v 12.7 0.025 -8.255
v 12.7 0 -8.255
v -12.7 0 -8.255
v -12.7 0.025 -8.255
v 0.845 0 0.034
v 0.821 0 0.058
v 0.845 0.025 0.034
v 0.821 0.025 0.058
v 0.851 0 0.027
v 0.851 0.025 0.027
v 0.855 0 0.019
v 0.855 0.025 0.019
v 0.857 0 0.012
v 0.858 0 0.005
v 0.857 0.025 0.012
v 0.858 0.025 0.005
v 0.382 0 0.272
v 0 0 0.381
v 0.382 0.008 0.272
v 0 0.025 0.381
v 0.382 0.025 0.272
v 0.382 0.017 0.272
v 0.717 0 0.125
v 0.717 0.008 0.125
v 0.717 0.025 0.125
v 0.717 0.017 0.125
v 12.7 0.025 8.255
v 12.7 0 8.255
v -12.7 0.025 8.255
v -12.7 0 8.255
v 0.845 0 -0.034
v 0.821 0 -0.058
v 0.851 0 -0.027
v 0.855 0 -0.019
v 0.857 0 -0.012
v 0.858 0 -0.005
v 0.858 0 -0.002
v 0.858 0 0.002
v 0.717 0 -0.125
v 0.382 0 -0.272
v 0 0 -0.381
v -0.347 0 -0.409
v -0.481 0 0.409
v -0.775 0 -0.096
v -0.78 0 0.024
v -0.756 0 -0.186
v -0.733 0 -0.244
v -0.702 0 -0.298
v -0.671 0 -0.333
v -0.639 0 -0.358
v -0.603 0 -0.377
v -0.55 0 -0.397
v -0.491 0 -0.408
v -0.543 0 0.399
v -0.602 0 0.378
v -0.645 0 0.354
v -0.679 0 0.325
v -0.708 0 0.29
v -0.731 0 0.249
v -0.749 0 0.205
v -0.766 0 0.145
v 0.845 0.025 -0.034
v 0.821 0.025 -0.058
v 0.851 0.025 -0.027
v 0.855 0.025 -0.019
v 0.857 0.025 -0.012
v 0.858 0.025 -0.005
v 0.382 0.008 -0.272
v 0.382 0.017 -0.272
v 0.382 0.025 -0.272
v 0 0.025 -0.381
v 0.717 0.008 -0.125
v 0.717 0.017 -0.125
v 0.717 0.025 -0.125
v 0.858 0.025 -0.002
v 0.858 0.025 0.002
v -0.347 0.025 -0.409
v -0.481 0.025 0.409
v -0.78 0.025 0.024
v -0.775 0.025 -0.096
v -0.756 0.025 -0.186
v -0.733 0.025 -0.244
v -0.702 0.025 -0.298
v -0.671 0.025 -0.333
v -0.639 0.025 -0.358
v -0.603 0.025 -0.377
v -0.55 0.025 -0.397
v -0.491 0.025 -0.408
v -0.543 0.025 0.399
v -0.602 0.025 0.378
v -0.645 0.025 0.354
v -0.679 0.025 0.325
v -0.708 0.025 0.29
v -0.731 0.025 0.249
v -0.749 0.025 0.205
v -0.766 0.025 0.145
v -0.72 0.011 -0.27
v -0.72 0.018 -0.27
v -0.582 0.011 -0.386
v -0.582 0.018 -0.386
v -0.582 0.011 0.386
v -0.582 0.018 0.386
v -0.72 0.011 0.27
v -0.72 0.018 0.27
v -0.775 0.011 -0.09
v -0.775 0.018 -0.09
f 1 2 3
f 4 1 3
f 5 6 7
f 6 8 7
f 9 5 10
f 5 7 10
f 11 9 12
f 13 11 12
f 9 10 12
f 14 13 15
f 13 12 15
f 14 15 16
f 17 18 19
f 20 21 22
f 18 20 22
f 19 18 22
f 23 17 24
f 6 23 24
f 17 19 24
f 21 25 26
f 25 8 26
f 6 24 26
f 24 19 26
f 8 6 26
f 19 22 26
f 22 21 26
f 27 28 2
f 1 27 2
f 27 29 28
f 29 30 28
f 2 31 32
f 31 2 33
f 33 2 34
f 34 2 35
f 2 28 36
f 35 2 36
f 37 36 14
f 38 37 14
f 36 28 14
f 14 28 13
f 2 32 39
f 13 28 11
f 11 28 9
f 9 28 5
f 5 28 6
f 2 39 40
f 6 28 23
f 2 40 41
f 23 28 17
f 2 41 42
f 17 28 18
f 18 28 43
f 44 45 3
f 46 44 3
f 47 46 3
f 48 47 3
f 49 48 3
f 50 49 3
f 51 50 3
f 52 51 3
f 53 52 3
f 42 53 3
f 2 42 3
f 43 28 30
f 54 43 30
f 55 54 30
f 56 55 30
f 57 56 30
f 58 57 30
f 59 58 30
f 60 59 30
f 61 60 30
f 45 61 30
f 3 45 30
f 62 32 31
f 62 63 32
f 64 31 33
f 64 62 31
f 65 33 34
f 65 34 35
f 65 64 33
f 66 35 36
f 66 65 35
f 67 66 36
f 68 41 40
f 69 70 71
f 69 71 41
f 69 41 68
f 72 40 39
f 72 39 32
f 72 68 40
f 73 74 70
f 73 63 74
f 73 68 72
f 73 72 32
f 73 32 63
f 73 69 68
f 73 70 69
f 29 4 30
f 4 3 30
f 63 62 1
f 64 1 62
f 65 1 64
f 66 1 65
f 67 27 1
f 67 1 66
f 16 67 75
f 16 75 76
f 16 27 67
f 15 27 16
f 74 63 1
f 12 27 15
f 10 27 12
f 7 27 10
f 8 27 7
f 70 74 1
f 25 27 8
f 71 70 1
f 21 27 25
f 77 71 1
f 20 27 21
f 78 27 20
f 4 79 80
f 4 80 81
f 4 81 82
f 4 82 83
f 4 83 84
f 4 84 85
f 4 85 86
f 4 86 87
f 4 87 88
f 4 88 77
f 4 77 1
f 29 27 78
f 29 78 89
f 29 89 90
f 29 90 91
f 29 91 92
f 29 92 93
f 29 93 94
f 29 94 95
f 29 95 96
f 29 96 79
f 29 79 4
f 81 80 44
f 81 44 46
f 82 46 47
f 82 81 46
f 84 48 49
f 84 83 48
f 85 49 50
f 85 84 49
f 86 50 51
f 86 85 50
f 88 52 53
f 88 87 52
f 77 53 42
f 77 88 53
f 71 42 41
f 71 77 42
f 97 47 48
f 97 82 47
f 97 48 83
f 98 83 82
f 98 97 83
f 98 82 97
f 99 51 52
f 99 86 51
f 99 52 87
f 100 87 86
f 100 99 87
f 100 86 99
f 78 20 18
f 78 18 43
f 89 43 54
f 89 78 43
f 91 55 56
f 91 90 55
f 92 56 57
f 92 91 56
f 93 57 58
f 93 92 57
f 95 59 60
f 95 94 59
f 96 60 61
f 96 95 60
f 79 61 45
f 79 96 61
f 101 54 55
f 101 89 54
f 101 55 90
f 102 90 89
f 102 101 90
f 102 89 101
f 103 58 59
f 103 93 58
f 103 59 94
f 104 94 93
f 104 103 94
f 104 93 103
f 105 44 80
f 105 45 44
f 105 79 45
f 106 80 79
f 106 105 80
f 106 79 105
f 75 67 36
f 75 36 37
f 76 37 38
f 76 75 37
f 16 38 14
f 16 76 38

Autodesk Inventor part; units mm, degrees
ref_plane "YZ Plane" through (0, 0, 0) normal (1, 0, 0) x (0, 1, 0)
ref_plane "XZ Plane" through (0, 0, 0) normal (0, 1, 0) x (-1, 0, 0)
ref_plane "XY Plane" through (0, 0, 0) normal (0, 0, 1) x (1, 0, 0)
sketch "stock_cut_for_holder" plane through (0, 0, 0) normal (0, 1, 0) x (-1, 0, 0)
  line L0 (-12.7, -8.255) -> (12.7, -8.255)
  line L1 (12.7, -8.255) -> (12.7, 8.255)
  line L2 (12.7, 8.255) -> (-12.7, 8.255)
  line L3 (-12.7, 8.255) -> (-12.7, -8.255)
  line L4 (-12.7, -8.255) -> (12.7, 8.255) construction
  line L5 (12.7, -8.255) -> (-12.7, 8.255) construction
  point P0 (0, 0)
  dimension "cut_shim_height" = 25.4
  dimension "cut_shim_width" = 16.51
extrude "Plate1" add sketch "stock_cut_for_holder" along normal blind 0.0254
sketch "mill_path" plane through (0, 0.0254, 0) normal (0, 1, 0) x (1, 0, 0)
  line L0 (12.7, 8.255) -> (12.7, -8.255) projected
  line L1 (-12.7, 8.255) -> (12.7, 8.255) projected
  line L2 (-12.7, -8.255) -> (-12.7, 8.255) projected
  line L3 (12.7, -8.255) -> (-12.7, -8.255) projected
  line L4 (-12.7, 8.255) -> (-12.7, -8.255) projected
  line L5 (-12.7, 0) -> (12.7, 0) construction
  line L6 (12.7, -8.255) -> (12.7, 8.255) projected
  line L7 (0, 0) -> (0, -0.381) construction
  line L8 (0, 0) -> (0, 0.381) construction
  line L9 (-0.4445, 0) -> (-0.4445, -0.4255) construction
  line L10 (-0.4445, 0) -> (-0.4445, 0.4254) construction
  line L11 (0.5842, 0) -> (0.5842, -0.1905) construction
  line L12 (-0.6795, 0) -> (-0.6795, -0.3747) construction
  line L13 (0.5842, 0) -> (0.5842, 0.1905) construction
  line L14 (-0.6795, 0) -> (-0.6795, 0.3746) construction
  line L15 (-0.5398, 0) -> (-0.5397, -0.4001) construction
  line L16 (-0.5398, 0) -> (-0.5398, 0.4) construction
  line L17 (0.5842, 0) -> (0.5842, 0.1905) construction
  line L18 (-0.7747, 0) -> (-0.7747, -0.1778) construction
  line L19 (-0.7747, 0) -> (-0.7747, 0.1778)
  line L20 (0.8382, 0) -> (0.8382, -0.0419) construction
  line L21 (0.8382, 0) -> (0.8382, 0.0419) construction
  spline S0 degree 3 poles (0, -0.381) (0.3656, -0.3096) (0.8827, -0.082) (0.8572, 0) knots 0 0 0 0 1 1 1 1
  spline S1 degree 3 poles (0, 0.381) (0.3656, 0.3096) (0.8827, 0.082) (0.8572, 0) knots 0 0 0 0 1 1 1 1
  line L22 (0, -0.381) -> (-0.4445, -0.4255) construction
  line L23 (-0.4445, -0.4255) -> (-0.5397, -0.4001) construction
  line L24 (-0.5397, -0.4001) -> (-0.6795, -0.3747) construction
  line L25 (-0.6795, -0.3747) -> (-0.7747, -0.1778) construction
  line L26 (-0.7747, -0.1778) -> (-0.7849, 0) construction
  line L27 (-0.7849, 0) -> (-0.7747, 0.1778) construction
  line L28 (-0.7747, 0.1778) -> (-0.6795, 0.3746) construction
  line L29 (-0.6795, 0.3746) -> (-0.5398, 0.4) construction
  line L30 (-0.5398, 0.4) -> (-0.4445, 0.4254) construction
  line L31 (-0.4445, 0.4254) -> (0, 0.381) construction
  spline S2 degree 4 poles (0, -0.381) (-0.4445, -0.4255) (-0.5397, -0.4001) (-0.6795, -0.3747) (-0.7747, -0.1778) (-0.7849, 0) (-0.7747, 0.1778) (-0.6795, 0.3746) (-0.5398, 0.4) (-0.4445, 0.4254) (0, 0.381) knots 1 1 1 1 1 2 3 4 5 6 7 8 8 8 8 8
  dimension "half_mid_thorax_width" = 0.381
  dimension "mid_thorax_to_prescutum" = 0.4445
  dimension "w2" = 0.4254
  dimension "d9" = 0.1905
  dimension "mid_thorax_to_anterior_scutellum" = 0.5842
  dimension "d11" = 0.3746
  dimension "d13" = 0.4001
  dimension "head_thorax" = 0.0953
  dimension "d15" = 0.1397
  dimension "d17" = 0.1778
  dimension "d18" = 0.0953
  dimension "scutellum_taper" = 0.254
  dimension "d20" = 0.0419
  dimension "d21" = 0.0191
  dimension "d22" = 0.0102
  dimension "d24" = 0.3302
  dimension "d25" = 1.6421
extrude "milled_hole" cut sketch "mill_path" against normal blind 0.0254 contours S2 S1 S0
fillet "Corner Round1" radius 0.127 1 edges at (0.8572, 0.0127, 0)
equation "\"d26\" = Thickness"
equation "\"BendRadius\" = Thickness"
equation "\"BendReliefWidth\" = Thickness"
equation "\"BendReliefDepth\" = 0.5 * Thickness"
equation "\"CornerReliefSize\" = 4 * Thickness"
equation "\"MinimumRemnant\" = 2 * Thickness"
equation "\"TransitionRadius\" = BendRadius"
equation "\"JacobiRadiusSize\" = BendRadius"
equation "\"GapSize\" = Thickness"
equation "\"d2\" = BendRadius"
equation "\"Thickness\" = 0.0254"
properties part number "antennal_lobe_sheet_model_v03" material "Stainless Steel AISI 317"
